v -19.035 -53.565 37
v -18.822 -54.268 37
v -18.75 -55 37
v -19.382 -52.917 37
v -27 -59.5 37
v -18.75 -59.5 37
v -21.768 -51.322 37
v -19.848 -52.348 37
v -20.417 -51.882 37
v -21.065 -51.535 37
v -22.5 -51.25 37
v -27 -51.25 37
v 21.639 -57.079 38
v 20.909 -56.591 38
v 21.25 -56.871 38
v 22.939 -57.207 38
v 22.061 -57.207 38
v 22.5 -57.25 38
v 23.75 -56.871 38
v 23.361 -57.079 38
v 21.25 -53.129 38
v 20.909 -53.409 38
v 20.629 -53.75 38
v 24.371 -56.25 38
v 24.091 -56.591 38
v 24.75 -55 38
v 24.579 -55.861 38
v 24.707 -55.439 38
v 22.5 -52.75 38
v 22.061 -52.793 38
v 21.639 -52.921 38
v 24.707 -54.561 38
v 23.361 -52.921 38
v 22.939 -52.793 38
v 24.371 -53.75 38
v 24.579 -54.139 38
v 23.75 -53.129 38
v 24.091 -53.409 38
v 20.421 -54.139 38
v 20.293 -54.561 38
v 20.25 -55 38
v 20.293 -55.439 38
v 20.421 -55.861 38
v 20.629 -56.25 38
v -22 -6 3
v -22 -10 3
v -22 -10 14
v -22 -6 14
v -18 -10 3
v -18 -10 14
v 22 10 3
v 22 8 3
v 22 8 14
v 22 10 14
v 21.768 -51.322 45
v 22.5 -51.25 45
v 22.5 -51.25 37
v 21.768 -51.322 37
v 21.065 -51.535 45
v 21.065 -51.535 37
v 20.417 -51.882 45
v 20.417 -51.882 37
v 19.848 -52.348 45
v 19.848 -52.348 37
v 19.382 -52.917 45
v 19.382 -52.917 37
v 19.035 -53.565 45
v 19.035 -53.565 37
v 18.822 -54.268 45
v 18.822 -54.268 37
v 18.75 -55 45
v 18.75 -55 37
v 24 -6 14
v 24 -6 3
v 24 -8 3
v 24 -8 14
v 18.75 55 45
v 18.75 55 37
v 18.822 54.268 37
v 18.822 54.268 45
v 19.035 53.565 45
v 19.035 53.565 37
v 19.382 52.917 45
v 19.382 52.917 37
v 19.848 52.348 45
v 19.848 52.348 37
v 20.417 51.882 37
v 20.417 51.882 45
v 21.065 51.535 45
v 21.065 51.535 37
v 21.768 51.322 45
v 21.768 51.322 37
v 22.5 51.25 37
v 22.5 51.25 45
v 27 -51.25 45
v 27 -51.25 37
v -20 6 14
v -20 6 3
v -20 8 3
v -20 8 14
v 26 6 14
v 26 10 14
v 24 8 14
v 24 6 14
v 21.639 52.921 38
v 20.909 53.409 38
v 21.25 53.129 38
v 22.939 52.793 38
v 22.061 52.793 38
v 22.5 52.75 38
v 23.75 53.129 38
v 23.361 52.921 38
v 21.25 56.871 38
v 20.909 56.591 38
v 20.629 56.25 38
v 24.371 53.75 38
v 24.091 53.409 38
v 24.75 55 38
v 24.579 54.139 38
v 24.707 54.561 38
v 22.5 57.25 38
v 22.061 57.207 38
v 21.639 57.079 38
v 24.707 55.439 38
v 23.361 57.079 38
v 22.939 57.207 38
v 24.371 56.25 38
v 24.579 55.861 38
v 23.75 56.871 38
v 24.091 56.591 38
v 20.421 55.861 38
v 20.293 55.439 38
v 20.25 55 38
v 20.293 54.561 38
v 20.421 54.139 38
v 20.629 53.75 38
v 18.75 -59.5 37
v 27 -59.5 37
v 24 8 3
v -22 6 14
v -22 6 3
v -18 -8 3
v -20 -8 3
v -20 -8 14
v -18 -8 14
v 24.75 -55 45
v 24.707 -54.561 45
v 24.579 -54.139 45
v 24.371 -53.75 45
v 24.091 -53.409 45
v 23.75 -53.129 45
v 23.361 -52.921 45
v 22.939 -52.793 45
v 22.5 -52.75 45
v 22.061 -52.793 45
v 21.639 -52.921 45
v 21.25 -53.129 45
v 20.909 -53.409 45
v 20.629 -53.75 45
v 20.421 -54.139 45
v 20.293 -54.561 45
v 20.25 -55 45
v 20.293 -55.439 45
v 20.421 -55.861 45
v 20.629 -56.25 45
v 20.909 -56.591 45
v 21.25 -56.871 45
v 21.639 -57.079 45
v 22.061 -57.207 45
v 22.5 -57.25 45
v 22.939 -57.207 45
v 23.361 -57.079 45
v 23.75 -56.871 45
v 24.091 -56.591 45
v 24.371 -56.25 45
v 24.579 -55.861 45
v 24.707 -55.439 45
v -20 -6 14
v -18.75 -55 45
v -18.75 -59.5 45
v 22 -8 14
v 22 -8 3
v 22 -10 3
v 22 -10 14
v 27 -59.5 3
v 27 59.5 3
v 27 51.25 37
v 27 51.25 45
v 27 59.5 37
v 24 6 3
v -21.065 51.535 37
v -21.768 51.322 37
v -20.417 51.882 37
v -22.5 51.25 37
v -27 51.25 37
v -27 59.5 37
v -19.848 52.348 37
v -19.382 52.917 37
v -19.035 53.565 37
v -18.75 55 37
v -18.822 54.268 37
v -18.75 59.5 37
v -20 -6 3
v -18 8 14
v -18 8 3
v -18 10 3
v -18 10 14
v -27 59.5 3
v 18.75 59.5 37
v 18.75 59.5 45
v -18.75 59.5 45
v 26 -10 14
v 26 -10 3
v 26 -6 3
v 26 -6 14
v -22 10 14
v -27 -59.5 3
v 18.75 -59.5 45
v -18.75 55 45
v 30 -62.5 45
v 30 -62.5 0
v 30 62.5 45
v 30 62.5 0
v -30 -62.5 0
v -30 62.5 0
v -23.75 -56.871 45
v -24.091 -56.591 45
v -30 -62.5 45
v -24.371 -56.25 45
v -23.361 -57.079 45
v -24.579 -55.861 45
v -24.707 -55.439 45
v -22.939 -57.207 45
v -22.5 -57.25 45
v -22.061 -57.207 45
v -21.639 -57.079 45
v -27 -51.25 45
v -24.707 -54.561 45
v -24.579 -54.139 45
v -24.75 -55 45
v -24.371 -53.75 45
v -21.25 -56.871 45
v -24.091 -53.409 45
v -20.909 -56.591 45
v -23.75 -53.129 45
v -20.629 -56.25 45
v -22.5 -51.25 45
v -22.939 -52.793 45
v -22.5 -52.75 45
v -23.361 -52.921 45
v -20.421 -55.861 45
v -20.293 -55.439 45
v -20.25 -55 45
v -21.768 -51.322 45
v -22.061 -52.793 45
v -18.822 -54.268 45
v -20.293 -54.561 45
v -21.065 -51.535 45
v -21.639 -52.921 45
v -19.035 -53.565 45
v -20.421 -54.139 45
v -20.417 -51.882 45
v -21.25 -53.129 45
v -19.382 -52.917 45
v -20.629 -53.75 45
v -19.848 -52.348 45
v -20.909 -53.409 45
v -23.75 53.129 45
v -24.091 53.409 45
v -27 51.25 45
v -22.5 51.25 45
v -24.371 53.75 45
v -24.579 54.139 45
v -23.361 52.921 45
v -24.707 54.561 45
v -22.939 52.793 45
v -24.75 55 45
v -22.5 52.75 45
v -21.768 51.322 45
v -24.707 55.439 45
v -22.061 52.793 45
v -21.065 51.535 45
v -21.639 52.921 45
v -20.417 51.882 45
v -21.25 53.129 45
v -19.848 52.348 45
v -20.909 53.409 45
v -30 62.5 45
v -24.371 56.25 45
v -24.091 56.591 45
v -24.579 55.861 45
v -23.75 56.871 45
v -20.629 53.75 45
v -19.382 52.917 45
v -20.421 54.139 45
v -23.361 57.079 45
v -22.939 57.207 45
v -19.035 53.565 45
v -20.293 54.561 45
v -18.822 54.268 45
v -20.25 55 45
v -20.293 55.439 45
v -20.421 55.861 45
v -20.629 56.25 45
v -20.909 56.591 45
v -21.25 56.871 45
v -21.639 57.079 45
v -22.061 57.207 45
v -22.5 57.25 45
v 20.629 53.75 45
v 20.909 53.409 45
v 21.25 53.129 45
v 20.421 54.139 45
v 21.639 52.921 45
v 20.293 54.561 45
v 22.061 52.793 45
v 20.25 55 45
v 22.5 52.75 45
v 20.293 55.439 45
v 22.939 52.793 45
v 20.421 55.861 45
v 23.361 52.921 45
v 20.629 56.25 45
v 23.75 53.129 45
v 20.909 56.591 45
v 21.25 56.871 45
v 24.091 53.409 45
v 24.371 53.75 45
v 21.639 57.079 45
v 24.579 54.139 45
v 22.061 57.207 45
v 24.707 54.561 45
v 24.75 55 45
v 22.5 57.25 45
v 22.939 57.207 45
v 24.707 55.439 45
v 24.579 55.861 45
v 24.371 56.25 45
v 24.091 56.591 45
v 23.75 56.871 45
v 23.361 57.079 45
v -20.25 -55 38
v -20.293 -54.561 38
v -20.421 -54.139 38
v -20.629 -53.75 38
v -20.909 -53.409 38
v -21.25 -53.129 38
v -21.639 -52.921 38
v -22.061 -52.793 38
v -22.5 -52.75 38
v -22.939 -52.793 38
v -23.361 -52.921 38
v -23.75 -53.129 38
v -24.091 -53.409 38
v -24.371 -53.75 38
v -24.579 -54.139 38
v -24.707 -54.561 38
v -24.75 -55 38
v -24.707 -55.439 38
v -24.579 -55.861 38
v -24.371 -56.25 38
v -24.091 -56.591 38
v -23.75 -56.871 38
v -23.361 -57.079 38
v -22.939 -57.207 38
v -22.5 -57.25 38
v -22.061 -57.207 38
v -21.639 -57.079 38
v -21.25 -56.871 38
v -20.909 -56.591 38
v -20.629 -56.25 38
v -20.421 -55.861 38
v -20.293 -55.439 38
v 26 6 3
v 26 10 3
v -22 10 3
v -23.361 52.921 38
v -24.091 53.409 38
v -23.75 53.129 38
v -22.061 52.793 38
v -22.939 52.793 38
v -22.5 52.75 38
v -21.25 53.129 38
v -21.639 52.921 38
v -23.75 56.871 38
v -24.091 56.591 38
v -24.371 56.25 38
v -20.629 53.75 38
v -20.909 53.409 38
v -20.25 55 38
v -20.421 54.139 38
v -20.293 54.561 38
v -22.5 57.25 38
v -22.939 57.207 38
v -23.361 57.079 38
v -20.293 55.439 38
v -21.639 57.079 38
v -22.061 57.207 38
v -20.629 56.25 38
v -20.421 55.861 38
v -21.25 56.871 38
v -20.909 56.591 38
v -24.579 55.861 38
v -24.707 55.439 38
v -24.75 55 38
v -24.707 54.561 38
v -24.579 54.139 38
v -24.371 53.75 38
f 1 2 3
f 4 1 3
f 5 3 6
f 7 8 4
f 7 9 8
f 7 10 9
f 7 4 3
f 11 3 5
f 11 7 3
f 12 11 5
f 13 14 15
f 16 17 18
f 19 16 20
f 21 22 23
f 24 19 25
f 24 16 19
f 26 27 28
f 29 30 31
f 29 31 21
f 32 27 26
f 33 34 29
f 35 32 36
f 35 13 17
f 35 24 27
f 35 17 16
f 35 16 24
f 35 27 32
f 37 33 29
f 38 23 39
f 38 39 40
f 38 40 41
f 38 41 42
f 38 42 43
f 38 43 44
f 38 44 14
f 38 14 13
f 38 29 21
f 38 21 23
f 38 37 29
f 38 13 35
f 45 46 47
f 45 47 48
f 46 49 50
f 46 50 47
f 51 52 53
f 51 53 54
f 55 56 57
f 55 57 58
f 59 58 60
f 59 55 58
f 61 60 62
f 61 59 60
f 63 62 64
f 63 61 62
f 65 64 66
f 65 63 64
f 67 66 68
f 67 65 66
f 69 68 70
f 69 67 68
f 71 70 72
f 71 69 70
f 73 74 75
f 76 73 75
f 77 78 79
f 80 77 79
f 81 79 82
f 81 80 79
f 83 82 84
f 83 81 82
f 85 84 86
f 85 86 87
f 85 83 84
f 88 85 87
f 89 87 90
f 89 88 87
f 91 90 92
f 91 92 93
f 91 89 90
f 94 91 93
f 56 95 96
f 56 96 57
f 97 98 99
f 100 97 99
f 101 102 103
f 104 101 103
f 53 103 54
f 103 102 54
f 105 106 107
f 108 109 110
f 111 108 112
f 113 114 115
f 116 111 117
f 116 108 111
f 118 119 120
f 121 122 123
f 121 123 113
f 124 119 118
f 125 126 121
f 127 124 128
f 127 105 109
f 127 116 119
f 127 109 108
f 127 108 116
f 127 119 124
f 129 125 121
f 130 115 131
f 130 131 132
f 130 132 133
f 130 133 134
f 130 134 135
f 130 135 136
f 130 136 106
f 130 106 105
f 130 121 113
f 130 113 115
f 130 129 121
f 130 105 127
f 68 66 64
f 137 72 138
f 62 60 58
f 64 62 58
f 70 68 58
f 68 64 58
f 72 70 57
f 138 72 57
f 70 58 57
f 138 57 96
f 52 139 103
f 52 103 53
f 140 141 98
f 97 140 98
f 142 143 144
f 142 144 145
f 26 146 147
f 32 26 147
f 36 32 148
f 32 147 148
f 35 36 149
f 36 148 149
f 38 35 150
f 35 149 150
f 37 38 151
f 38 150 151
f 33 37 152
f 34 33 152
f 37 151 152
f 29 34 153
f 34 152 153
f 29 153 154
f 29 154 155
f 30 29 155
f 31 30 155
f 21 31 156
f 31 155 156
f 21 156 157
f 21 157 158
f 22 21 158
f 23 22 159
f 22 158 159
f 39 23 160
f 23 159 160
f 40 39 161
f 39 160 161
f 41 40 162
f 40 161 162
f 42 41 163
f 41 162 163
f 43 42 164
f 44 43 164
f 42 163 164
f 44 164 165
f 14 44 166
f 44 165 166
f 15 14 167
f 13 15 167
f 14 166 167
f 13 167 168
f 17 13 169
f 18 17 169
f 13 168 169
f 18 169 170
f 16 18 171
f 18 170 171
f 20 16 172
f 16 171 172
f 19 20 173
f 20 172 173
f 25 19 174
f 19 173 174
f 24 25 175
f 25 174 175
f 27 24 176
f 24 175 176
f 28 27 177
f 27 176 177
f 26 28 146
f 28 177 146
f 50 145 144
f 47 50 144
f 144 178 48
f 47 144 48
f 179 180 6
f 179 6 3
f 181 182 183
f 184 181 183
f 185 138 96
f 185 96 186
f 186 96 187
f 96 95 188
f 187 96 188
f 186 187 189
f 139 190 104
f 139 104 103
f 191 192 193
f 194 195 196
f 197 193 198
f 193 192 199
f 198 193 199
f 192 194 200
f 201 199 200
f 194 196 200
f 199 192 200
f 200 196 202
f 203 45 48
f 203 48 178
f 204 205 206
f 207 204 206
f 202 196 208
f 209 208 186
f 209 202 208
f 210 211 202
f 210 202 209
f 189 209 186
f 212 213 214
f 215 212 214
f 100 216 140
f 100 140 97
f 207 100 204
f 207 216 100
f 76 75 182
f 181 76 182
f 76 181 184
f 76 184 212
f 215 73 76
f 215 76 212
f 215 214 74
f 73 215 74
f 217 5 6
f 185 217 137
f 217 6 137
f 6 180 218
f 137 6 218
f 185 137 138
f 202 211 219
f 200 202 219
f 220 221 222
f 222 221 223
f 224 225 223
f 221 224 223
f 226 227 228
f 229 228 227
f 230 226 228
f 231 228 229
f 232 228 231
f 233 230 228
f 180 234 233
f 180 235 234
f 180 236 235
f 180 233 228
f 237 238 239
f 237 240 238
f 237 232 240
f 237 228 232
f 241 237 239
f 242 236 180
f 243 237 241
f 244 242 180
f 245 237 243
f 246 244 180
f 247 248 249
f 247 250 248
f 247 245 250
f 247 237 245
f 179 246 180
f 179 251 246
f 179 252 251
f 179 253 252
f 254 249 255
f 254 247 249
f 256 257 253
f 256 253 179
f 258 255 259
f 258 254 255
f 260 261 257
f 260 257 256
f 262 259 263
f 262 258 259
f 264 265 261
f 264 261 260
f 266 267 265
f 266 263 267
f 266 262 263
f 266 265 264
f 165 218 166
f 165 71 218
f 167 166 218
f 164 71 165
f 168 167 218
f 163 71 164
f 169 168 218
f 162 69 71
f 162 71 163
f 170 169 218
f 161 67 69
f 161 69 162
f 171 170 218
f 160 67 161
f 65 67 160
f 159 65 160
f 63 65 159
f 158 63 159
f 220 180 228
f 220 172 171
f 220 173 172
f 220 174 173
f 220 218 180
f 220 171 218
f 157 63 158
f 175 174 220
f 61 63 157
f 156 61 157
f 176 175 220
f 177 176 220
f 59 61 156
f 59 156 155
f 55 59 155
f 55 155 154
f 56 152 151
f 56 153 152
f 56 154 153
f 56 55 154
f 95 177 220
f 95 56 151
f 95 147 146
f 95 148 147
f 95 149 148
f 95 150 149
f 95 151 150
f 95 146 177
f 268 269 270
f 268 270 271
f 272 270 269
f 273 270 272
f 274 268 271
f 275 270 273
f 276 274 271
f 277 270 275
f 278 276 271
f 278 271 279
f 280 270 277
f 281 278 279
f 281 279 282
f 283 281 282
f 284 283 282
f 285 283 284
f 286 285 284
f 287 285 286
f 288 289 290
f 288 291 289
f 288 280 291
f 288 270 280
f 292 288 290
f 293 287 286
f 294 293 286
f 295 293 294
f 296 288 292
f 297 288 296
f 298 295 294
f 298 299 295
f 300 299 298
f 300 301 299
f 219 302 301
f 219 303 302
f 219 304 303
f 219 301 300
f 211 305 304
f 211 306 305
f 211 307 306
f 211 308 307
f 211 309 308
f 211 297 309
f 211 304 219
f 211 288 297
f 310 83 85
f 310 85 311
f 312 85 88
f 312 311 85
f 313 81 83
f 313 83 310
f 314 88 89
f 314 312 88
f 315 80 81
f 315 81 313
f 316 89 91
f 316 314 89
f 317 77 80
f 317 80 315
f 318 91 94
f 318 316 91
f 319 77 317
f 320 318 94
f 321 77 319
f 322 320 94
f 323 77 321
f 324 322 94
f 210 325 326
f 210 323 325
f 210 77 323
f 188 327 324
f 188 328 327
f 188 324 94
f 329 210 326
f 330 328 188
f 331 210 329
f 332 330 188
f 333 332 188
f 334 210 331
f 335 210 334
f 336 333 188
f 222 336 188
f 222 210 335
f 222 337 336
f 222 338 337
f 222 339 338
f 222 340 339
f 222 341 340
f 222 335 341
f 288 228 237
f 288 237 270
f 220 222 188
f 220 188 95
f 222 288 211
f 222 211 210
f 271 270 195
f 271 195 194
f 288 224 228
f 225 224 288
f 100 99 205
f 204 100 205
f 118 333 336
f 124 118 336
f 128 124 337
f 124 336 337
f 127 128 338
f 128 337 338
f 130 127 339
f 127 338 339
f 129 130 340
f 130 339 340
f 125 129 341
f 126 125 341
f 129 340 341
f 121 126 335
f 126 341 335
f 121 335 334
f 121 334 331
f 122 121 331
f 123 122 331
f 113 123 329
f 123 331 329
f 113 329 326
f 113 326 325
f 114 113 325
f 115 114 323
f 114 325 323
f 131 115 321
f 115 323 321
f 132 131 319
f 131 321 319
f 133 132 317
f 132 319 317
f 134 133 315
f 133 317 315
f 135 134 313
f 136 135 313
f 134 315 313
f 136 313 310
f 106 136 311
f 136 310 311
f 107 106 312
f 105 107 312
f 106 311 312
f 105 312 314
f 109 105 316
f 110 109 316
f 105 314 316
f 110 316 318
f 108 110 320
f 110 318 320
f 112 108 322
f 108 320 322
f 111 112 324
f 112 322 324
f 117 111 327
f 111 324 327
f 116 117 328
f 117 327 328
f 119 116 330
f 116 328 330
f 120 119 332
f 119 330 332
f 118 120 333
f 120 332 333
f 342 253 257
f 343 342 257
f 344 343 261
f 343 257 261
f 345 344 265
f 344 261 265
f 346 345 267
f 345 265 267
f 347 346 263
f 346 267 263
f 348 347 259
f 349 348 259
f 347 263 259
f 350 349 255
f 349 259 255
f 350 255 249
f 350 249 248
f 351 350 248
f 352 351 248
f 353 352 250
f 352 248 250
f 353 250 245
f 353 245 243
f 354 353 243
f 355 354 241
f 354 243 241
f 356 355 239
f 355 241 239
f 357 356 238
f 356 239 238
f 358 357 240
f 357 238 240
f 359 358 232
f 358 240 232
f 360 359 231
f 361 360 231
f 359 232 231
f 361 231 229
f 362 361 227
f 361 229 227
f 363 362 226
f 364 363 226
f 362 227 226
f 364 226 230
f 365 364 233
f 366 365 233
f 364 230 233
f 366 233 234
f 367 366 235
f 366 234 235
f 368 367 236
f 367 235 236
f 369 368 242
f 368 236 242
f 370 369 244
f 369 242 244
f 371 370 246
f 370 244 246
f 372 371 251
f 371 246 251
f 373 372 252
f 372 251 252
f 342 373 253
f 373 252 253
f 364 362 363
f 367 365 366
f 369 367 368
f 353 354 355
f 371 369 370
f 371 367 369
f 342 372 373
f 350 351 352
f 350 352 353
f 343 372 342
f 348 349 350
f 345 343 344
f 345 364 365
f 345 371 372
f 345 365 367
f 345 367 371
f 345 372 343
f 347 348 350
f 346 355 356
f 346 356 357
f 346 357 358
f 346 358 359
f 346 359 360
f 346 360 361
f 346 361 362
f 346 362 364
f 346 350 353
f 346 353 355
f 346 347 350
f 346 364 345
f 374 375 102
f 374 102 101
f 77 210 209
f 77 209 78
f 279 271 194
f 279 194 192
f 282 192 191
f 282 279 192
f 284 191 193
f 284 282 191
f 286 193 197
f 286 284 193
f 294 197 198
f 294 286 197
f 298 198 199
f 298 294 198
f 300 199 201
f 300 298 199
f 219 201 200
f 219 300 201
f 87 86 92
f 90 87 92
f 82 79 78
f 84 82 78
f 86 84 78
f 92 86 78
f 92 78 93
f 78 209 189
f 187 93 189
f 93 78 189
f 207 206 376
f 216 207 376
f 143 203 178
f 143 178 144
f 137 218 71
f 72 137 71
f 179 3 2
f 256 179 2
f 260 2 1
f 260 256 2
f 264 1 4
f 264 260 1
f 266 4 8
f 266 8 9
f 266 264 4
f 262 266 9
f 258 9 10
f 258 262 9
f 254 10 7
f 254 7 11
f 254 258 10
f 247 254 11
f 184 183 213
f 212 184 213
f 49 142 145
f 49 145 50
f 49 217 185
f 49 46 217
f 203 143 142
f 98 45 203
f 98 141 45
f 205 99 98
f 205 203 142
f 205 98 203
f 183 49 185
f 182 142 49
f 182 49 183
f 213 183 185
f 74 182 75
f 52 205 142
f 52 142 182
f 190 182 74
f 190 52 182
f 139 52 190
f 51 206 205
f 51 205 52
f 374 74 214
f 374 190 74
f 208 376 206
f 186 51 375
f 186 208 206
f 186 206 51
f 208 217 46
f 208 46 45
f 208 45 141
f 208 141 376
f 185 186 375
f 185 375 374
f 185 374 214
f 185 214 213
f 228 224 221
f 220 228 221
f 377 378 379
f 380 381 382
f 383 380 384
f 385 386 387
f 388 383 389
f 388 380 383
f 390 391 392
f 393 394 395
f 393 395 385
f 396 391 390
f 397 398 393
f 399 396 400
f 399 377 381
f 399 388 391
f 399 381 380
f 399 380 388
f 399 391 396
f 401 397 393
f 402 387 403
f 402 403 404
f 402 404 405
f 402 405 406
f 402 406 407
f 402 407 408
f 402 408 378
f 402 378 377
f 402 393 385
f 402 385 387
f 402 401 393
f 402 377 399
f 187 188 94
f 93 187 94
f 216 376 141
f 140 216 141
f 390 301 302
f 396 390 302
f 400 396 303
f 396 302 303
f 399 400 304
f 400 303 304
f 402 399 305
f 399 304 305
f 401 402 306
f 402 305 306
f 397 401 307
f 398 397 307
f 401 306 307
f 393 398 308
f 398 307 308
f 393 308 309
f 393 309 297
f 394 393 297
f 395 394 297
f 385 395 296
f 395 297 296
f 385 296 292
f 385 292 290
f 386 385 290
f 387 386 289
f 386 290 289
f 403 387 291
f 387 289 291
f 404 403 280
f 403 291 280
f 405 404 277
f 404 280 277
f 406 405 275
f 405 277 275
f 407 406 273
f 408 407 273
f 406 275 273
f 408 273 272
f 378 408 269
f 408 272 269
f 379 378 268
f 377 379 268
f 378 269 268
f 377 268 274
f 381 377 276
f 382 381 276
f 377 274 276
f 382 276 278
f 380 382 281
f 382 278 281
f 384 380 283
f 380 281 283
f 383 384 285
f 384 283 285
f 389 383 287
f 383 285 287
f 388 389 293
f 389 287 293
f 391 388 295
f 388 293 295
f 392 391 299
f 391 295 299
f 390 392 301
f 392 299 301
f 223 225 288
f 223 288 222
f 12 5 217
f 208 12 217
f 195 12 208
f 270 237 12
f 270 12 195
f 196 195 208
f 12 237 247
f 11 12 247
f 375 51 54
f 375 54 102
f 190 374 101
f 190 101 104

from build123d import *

# Parameters (mm, degrees)
SKETCH_W        = 60
SKETCH_H        = 125
PAD_DEPTH       = 45
SKETCH001_W     = 54
SKETCH001_H     = 119
POCKET_DEPTH    = 42
PAD001_DEPTH    = 8
SKETCH003_R     = 2.25
POCKET001_DEPTH = 7
PAD002_DEPTH    = 11


with BuildPart() as part:
    # Sketch → Pad (new body)
    with BuildSketch(Plane.XY):
        Rectangle(SKETCH_W, SKETCH_H)
    extrude(amount=PAD_DEPTH)

    # Sketch001 (on Face6 of Pad) → Pocket (cut)
    with BuildSketch(Plane.XY.offset(45)):
        Rectangle(SKETCH001_W, SKETCH001_H)
    extrude(amount=-POCKET_DEPTH, mode=Mode.SUBTRACT)

    # Sketch002 (on Face5 of Pocket) → Pad001 (join)
    with BuildSketch(Plane.XY.offset(45)):
        with BuildLine():
            ThreePointArc((22.5, -51.25), (19.84835, -52.34835), (18.75, -55))
            Line((18.75, -60.445518), (18.75, -55))
            Line((18.75, -60.445518), (27, -59.5))
            Line((27.750854, -51.25), (27, -59.5))
            Line((27.750854, -51.25), (22.5, -51.25))
        make_face()
        with BuildLine():
            Line((-18.75, -60.445518), (-27, -59.5))
            Line((-27.750854, -51.25), (-27, -59.5))
            Line((-27.750854, -51.25), (-22.5, -51.25))
            ThreePointArc((-18.75, -55), (-19.84835, -52.34835), (-22.5, -51.25))
            Line((-18.75, -60.445518), (-18.75, -55))
        make_face()
        with BuildLine():
            Line((-18.75, 60.445518), (-27, 59.5))
            Line((-27.750854, 51.25), (-27, 59.5))
            Line((-27.750854, 51.25), (-22.5, 51.25))
            ThreePointArc((-22.5, 51.25), (-19.84835, 52.34835), (-18.75, 55))
            Line((-18.75, 60.445518), (-18.75, 55))
        make_face()
        with BuildLine():
            Line((18.75, 60.445518), (18.75, 55))
            ThreePointArc((18.75, 55), (19.84835, 52.34835), (22.5, 51.25))
            Line((27.750854, 51.25), (22.5, 51.25))
            Line((27.750854, 51.25), (27, 59.5))
            Line((18.75, 60.445518), (27, 59.5))
        make_face()
    extrude(amount=-PAD001_DEPTH)

    # Sketch003 (on Face6 of Pad001) → Pocket001 (cut)
    with BuildSketch(Plane.XY.offset(45)):
        with Locations((22.5, 55)):
            Circle(SKETCH003_R)
        with Locations((-22.5, 55)):
            Circle(SKETCH003_R)
        with Locations((22.5, -55)):
            Circle(SKETCH003_R)
        with Locations((-22.5, -55)):
            Circle(SKETCH003_R)
    extrude(amount=-POCKET001_DEPTH, mode=Mode.SUBTRACT)

    # Sketch004 (on Face32 of Pocket001) → Pad002 (join)
    with BuildSketch(Plane.XY.offset(3)):
        Polygon((-18, 8), (-18, 10), (-22, 10), (-22, 6), (-20, 6), (-20, 8), align=None)
        Polygon((-18, -8), (-18, -10), (-22, -10), (-22, -6), (-20, -6), (-20, -8), align=None)
        Polygon((22, 8), (22, 10), (26, 10), (26, 6), (24, 6), (24, 8), align=None)
        Polygon((22, -8), (22, -10), (26, -10), (26, -6), (24, -6), (24, -8), align=None)
    extrude(amount=PAD002_DEPTH)


solid = part.part
